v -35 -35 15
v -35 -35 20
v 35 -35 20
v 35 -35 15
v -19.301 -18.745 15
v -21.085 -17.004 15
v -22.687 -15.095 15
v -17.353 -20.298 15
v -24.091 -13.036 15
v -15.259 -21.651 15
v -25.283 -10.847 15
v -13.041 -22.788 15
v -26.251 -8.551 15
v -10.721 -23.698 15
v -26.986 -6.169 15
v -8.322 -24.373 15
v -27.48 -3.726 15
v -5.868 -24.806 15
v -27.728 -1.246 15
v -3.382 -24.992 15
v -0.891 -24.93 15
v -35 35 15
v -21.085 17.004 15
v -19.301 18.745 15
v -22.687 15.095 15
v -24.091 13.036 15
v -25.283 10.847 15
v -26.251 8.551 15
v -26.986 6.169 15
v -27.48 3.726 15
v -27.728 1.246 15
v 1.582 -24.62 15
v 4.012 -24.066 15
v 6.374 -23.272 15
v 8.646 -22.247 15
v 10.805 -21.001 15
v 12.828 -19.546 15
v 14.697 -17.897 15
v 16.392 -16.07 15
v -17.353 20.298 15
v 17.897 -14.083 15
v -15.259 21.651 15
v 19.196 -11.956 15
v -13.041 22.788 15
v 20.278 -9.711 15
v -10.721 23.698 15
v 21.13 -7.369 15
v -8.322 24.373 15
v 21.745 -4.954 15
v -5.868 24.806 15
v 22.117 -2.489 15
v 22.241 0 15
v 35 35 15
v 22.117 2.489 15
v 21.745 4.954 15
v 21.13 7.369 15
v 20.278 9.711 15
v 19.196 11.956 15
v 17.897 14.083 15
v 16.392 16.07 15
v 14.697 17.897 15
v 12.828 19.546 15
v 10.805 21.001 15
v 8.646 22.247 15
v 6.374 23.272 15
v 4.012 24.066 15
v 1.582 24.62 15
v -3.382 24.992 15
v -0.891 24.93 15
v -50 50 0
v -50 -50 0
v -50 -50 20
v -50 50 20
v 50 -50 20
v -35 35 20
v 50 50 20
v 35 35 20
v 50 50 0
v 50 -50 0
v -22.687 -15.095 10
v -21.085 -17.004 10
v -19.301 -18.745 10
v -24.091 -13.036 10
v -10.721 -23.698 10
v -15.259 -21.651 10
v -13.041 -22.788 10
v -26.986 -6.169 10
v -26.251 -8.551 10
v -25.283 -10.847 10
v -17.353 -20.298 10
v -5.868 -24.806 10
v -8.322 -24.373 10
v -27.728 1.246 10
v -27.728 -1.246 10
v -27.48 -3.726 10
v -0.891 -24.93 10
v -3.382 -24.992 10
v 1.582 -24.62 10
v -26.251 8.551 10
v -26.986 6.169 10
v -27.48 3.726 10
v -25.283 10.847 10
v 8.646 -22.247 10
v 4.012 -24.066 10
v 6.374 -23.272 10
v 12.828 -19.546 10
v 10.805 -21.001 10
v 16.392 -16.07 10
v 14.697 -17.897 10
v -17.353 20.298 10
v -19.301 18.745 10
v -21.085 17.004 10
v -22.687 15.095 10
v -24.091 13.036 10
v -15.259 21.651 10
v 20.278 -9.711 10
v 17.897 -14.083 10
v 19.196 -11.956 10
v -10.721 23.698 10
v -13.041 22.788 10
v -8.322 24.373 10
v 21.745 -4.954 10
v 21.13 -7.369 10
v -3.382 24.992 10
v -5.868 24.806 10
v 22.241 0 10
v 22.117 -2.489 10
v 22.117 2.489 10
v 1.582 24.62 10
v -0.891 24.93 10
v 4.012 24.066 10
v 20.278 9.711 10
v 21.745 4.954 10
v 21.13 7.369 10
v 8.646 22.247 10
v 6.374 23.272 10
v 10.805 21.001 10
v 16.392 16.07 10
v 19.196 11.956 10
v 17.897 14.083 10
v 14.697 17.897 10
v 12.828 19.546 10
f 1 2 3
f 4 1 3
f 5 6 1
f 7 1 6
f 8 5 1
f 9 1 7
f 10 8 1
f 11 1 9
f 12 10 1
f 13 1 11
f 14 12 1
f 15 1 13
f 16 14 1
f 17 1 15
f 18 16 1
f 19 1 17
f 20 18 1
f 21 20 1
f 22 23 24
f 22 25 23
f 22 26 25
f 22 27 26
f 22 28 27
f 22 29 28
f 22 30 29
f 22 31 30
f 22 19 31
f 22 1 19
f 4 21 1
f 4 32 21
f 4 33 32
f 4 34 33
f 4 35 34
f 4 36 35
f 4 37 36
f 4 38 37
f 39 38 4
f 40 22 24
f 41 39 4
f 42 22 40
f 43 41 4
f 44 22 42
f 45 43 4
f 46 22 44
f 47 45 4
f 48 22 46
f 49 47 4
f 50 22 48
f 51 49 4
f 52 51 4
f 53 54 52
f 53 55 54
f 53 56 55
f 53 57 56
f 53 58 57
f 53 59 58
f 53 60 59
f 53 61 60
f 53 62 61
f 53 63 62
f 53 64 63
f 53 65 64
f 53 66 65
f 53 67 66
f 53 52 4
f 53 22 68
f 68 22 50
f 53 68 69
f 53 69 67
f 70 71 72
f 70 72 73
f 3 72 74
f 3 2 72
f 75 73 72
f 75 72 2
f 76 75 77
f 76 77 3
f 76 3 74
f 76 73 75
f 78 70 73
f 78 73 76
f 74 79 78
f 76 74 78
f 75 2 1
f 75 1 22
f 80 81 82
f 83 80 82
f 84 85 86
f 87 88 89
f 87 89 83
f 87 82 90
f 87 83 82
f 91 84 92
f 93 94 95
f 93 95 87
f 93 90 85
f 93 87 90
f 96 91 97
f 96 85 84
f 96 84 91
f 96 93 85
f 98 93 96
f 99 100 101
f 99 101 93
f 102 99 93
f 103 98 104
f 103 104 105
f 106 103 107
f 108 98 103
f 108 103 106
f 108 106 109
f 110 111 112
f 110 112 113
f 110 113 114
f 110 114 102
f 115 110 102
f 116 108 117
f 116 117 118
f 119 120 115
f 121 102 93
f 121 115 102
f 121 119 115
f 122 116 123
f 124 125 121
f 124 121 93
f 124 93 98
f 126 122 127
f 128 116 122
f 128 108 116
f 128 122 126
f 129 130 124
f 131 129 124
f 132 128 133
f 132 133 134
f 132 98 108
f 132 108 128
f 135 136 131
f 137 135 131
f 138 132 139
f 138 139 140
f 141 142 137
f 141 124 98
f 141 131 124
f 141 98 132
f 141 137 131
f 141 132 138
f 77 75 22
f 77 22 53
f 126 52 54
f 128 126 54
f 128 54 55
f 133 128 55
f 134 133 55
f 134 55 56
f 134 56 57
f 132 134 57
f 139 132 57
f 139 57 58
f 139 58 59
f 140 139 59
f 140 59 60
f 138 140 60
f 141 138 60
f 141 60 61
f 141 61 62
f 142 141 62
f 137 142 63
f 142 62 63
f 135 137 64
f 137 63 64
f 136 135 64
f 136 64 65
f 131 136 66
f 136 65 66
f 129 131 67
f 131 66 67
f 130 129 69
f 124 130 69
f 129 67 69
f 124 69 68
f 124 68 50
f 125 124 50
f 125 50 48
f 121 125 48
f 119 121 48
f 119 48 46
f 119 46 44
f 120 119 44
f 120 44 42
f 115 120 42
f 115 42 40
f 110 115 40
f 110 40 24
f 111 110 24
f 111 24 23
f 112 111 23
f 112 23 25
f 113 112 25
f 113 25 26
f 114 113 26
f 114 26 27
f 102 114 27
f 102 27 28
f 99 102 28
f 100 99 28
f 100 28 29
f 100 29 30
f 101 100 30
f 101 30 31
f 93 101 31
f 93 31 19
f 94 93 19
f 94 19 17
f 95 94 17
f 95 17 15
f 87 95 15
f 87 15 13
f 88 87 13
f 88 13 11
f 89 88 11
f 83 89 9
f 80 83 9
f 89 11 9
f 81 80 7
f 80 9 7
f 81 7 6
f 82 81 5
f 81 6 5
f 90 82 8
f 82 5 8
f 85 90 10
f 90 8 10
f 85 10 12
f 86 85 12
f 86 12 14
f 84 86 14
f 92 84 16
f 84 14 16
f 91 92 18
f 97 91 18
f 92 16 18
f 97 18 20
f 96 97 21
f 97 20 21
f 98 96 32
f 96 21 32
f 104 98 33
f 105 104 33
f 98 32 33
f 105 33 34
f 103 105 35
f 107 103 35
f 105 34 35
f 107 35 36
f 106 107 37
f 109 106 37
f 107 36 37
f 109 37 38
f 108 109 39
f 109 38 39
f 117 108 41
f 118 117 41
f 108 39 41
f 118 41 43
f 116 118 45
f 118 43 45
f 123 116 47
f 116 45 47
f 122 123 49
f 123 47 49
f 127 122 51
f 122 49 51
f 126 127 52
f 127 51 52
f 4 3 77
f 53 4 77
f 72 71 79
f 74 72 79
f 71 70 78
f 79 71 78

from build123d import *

# Parameters (mm, degrees)
F0_W     = 100
F0_H     = 100
F1_DEPTH = 20
F2_R     = 25
F3_DEPTH = 10
F4_W     = 70
F4_H     = 70
F5_DEPTH = 5


with BuildPart() as f1:
    # F0 (on Top) → F1 (new body)
    with BuildSketch(Plane.XY):
        Rectangle(F0_W, F0_H)
    extrude(amount=F1_DEPTH)

    # F2 (on face) → F3 (cut)
    with BuildSketch(Plane.XY.offset(20)):
        with Locations((-2.75913, 0)):
            Circle(F2_R)
    extrude(amount=-F3_DEPTH, mode=Mode.SUBTRACT)

    # F4 (on face) → F5 (cut)
    with BuildSketch(Plane.XY.offset(20)):
        Rectangle(F4_W, F4_H)
    extrude(amount=-F5_DEPTH, mode=Mode.SUBTRACT)


solid = f1.part
